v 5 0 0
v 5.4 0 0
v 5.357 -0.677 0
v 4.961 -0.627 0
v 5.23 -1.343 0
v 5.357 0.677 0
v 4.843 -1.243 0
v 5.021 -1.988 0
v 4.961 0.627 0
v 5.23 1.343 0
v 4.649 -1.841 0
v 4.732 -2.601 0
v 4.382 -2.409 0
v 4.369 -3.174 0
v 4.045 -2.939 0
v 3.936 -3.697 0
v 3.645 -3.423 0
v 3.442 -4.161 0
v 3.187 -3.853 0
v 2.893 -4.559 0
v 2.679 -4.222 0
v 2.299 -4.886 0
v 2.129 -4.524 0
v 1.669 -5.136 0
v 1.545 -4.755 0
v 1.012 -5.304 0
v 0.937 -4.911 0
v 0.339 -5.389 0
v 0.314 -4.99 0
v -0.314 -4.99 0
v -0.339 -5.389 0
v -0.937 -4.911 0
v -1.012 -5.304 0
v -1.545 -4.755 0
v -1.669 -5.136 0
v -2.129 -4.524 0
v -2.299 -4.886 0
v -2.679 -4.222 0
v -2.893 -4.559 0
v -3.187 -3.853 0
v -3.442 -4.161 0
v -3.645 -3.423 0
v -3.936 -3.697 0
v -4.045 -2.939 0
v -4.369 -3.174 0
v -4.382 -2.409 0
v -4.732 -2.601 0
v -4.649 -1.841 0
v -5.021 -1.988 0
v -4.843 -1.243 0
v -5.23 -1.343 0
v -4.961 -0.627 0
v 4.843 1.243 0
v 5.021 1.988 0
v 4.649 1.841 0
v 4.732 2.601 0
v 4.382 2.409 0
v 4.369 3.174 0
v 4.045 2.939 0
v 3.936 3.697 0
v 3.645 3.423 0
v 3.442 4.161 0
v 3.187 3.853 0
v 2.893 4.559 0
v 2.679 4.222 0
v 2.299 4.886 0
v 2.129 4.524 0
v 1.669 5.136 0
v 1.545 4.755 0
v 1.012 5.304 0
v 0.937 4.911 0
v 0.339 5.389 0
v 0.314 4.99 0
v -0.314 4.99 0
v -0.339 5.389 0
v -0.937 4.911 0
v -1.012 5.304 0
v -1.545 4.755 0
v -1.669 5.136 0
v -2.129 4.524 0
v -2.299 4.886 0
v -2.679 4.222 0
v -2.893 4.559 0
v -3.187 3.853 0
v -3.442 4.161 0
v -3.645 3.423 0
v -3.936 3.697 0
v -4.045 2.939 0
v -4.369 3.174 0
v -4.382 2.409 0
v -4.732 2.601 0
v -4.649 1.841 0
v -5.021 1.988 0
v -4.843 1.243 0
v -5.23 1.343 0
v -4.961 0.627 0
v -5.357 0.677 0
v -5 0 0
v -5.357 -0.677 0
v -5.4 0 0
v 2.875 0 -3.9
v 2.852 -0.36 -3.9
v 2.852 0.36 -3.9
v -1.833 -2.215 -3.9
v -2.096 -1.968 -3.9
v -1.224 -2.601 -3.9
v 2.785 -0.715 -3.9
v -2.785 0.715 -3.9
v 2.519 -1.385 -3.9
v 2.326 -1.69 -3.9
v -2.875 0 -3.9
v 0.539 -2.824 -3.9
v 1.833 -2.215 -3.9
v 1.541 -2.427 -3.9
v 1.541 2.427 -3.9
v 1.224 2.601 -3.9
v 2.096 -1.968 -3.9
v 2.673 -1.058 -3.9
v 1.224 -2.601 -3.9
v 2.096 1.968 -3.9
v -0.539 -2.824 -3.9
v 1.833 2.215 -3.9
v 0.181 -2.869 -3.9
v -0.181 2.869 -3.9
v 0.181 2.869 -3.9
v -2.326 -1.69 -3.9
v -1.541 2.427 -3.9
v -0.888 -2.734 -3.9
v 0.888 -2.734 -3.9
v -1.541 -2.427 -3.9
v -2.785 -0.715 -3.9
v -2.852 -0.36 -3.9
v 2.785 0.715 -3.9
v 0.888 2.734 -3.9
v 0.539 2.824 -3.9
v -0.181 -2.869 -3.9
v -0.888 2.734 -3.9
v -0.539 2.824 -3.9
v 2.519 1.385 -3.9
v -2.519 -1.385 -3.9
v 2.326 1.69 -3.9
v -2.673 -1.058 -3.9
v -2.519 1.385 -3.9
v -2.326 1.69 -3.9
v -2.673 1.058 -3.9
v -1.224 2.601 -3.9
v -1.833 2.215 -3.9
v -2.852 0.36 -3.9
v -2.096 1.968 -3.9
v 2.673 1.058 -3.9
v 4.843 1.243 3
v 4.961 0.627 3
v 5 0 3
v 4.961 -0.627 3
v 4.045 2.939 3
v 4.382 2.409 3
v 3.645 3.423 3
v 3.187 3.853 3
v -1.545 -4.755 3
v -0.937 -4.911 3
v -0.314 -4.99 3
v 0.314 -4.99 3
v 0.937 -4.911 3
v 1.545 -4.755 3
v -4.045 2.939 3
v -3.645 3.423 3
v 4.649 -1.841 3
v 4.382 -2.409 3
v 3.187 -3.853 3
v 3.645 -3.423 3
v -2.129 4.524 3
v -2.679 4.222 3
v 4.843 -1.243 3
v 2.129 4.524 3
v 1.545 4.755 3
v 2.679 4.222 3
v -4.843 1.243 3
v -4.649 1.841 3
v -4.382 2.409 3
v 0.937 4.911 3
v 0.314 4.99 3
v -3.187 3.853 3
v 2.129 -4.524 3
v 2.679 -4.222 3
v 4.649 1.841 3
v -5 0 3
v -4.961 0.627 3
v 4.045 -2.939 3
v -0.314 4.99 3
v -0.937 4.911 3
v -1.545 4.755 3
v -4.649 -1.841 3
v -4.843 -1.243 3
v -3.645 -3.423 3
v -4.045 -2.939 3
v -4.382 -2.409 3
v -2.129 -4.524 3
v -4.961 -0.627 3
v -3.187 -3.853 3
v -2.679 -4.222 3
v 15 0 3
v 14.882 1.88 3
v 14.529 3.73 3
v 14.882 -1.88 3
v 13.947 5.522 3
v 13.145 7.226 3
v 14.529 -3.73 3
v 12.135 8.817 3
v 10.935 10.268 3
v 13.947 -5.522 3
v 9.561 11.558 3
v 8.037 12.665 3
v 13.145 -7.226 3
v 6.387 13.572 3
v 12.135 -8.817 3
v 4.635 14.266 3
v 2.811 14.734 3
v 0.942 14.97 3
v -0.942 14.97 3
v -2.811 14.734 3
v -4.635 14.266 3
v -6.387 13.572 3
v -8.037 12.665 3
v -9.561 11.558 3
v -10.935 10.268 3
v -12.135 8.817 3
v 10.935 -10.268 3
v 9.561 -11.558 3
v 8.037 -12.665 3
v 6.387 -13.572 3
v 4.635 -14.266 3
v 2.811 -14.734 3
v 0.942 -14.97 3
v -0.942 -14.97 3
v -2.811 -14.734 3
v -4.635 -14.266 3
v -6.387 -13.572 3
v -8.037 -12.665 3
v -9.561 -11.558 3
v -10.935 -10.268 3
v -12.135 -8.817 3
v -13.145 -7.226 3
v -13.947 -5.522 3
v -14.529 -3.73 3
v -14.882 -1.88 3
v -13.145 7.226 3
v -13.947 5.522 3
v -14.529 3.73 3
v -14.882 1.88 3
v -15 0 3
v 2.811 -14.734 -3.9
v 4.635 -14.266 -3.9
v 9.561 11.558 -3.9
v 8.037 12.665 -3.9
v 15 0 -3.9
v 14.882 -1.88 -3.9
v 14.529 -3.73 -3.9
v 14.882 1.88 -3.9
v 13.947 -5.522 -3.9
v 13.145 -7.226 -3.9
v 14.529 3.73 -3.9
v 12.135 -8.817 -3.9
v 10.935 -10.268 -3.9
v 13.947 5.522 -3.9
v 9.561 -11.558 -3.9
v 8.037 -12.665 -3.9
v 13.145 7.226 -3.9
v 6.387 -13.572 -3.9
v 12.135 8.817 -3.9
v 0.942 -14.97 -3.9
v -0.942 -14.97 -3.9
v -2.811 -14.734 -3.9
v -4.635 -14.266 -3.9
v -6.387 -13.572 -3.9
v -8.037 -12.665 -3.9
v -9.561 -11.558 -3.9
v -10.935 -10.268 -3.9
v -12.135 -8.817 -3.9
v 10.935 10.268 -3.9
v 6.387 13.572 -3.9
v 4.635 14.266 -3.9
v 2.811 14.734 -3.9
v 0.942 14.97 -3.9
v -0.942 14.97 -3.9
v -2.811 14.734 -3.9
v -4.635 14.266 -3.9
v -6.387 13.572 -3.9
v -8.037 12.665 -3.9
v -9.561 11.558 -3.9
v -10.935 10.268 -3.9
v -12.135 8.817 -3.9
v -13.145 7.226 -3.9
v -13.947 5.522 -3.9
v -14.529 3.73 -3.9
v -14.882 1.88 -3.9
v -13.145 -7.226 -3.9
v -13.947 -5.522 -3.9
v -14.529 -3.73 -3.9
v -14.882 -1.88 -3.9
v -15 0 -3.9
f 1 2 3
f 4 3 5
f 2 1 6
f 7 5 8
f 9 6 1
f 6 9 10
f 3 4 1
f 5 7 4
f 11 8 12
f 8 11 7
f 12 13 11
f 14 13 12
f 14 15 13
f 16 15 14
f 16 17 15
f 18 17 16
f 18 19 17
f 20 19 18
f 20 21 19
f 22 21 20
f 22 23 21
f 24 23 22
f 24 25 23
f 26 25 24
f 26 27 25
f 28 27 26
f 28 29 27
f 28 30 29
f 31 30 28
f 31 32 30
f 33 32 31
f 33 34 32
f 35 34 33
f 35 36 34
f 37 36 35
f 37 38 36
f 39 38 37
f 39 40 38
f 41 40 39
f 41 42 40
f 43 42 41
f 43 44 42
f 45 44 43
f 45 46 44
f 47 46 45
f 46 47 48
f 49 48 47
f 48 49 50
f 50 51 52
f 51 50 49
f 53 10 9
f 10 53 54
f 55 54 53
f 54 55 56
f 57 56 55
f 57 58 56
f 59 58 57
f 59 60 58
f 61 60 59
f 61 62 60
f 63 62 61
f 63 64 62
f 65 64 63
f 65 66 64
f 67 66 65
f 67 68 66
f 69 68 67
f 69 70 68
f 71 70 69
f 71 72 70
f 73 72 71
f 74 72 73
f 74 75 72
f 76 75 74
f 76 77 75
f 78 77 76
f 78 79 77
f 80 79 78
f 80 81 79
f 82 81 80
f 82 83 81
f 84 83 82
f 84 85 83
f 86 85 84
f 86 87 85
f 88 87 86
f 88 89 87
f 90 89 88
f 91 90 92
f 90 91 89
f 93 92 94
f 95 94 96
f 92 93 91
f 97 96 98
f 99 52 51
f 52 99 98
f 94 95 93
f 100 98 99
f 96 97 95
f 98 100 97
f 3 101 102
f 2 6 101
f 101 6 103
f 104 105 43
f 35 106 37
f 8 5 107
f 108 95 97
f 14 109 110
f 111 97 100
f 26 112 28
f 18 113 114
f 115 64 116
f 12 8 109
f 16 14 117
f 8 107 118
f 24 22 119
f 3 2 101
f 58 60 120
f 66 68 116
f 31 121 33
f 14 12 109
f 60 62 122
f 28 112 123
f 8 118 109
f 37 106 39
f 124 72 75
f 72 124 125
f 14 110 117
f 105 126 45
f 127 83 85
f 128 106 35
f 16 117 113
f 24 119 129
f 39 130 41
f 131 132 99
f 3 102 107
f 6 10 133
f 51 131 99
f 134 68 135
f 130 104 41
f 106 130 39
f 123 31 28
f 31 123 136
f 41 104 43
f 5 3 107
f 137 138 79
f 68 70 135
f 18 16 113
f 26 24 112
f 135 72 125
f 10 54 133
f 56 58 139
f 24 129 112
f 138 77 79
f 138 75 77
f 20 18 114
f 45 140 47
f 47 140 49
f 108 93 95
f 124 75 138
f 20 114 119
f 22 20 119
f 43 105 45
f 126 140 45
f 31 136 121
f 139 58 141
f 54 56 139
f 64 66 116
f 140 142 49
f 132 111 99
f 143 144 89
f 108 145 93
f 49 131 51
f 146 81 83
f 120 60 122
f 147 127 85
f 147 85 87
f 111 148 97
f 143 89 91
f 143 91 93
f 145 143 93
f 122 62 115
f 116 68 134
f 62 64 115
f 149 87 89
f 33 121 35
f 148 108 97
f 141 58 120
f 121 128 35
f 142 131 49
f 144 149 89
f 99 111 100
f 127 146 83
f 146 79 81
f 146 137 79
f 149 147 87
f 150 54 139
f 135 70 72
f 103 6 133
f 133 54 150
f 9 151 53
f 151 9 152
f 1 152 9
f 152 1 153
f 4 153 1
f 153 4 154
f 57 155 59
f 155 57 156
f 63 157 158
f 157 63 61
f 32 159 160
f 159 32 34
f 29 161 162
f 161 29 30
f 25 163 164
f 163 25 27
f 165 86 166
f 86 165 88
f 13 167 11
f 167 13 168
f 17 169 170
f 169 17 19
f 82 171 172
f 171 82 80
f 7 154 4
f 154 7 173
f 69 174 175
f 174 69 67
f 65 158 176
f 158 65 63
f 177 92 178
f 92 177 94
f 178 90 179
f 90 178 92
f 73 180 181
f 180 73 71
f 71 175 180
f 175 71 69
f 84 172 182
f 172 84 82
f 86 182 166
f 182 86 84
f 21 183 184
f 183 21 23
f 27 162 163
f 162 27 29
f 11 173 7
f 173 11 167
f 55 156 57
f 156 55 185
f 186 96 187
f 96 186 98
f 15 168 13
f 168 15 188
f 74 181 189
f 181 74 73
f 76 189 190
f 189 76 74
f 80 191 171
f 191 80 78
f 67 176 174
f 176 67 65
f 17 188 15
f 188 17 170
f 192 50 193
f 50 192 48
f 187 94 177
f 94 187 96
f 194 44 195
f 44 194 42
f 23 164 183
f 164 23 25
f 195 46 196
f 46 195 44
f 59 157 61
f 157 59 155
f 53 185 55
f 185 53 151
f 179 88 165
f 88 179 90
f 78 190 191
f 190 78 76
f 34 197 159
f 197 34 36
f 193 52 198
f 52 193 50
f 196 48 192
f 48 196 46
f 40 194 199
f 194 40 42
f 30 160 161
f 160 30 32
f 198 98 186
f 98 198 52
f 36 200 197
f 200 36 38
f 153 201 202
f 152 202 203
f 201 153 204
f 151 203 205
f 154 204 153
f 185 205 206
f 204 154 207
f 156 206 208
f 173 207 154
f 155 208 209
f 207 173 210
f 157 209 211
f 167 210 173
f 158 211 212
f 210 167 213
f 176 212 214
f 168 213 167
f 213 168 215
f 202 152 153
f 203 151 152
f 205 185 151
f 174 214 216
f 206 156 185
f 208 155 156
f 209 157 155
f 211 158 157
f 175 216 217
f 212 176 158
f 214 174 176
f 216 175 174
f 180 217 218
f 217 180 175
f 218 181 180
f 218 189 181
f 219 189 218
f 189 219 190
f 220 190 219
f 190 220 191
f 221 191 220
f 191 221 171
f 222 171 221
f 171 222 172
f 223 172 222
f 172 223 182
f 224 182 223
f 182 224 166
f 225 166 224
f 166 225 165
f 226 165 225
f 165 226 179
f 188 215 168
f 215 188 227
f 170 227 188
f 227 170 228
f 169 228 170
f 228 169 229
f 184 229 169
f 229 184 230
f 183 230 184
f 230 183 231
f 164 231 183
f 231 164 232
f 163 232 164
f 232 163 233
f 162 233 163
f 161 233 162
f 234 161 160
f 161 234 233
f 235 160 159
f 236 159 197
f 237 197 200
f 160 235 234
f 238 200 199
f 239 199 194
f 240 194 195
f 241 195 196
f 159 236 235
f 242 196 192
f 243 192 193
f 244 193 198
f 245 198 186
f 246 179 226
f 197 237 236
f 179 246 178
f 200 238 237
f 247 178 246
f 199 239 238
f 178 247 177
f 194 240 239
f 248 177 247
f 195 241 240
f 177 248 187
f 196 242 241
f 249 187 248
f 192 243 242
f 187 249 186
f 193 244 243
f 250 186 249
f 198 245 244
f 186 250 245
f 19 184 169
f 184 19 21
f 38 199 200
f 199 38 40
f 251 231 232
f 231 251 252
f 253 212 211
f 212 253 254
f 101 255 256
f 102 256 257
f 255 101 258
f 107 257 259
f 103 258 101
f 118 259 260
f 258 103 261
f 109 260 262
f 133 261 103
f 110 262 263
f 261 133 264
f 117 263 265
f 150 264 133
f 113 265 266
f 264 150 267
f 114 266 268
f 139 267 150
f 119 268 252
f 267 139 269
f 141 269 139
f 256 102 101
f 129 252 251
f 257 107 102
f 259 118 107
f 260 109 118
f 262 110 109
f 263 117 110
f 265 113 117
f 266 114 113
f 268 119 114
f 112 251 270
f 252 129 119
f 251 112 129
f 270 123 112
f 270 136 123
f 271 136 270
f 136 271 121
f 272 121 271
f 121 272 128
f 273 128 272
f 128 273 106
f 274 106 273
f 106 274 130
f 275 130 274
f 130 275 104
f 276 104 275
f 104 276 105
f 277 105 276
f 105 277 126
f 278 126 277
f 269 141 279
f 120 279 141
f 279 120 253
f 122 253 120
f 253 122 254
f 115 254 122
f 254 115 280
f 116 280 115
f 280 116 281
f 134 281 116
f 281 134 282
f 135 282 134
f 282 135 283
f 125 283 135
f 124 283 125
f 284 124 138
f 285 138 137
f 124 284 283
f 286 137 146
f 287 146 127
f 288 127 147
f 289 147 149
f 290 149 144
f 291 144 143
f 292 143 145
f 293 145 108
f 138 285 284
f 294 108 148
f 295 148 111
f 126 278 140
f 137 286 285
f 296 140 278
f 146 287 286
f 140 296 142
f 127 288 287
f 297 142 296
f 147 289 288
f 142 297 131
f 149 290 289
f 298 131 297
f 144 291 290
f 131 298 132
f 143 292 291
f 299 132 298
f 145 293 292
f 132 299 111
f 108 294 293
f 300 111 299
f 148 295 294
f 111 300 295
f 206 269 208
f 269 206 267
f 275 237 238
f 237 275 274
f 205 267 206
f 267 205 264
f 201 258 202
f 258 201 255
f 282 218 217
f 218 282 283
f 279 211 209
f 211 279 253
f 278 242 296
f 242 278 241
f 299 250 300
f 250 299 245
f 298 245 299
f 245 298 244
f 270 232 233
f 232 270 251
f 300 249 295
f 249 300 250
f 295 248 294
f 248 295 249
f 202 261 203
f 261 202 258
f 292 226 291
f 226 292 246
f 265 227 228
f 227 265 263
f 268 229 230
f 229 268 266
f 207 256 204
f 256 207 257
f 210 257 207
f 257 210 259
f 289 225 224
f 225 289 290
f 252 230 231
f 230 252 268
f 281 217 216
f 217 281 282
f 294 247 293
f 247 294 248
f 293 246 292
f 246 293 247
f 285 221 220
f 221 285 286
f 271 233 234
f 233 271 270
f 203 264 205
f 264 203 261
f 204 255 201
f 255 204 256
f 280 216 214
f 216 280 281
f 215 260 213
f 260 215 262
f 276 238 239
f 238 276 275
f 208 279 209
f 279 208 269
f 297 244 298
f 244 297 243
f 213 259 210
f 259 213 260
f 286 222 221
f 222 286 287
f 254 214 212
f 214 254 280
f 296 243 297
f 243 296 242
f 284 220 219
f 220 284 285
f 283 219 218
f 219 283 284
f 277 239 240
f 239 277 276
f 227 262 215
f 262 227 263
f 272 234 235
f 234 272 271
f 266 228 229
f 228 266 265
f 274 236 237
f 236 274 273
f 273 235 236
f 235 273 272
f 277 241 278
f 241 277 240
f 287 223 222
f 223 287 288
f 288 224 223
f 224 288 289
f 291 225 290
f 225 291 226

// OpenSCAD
$fn = 50;


difference() {
	union() {
		translate(v = [0, 0, -3.9000000000]) {
			cylinder(h = 6.9000000000, r = 15.0000000000);
		}
	}
	union() {
		translate(v = [0, 0, 0]) {
			rotate(a = [0, 0, 0]) {
				difference() {
					union() {
						translate(v = [0, 0, -6.9000000000]) {
							cylinder(h = 6.9000000000, r = 2.6000000000);
						}
						translate(v = [0, 0, -3.9000000000]) {
							cylinder(h = 3.9000000000, r1 = 2.8750000000, r2 = 5.4000000000);
						}
						translate(v = [0, 0, -6.9000000000]) {
							cylinder(h = 6.9000000000, r = 2.8750000000);
						}
						translate(v = [0, 0, -6.9000000000]) {
							cylinder(h = 6.9000000000, r = 2.6000000000);
						}
					}
					union();
				}
			}
		}
		#cylinder(h = 3, r = 5.0000000000);
	}
}
